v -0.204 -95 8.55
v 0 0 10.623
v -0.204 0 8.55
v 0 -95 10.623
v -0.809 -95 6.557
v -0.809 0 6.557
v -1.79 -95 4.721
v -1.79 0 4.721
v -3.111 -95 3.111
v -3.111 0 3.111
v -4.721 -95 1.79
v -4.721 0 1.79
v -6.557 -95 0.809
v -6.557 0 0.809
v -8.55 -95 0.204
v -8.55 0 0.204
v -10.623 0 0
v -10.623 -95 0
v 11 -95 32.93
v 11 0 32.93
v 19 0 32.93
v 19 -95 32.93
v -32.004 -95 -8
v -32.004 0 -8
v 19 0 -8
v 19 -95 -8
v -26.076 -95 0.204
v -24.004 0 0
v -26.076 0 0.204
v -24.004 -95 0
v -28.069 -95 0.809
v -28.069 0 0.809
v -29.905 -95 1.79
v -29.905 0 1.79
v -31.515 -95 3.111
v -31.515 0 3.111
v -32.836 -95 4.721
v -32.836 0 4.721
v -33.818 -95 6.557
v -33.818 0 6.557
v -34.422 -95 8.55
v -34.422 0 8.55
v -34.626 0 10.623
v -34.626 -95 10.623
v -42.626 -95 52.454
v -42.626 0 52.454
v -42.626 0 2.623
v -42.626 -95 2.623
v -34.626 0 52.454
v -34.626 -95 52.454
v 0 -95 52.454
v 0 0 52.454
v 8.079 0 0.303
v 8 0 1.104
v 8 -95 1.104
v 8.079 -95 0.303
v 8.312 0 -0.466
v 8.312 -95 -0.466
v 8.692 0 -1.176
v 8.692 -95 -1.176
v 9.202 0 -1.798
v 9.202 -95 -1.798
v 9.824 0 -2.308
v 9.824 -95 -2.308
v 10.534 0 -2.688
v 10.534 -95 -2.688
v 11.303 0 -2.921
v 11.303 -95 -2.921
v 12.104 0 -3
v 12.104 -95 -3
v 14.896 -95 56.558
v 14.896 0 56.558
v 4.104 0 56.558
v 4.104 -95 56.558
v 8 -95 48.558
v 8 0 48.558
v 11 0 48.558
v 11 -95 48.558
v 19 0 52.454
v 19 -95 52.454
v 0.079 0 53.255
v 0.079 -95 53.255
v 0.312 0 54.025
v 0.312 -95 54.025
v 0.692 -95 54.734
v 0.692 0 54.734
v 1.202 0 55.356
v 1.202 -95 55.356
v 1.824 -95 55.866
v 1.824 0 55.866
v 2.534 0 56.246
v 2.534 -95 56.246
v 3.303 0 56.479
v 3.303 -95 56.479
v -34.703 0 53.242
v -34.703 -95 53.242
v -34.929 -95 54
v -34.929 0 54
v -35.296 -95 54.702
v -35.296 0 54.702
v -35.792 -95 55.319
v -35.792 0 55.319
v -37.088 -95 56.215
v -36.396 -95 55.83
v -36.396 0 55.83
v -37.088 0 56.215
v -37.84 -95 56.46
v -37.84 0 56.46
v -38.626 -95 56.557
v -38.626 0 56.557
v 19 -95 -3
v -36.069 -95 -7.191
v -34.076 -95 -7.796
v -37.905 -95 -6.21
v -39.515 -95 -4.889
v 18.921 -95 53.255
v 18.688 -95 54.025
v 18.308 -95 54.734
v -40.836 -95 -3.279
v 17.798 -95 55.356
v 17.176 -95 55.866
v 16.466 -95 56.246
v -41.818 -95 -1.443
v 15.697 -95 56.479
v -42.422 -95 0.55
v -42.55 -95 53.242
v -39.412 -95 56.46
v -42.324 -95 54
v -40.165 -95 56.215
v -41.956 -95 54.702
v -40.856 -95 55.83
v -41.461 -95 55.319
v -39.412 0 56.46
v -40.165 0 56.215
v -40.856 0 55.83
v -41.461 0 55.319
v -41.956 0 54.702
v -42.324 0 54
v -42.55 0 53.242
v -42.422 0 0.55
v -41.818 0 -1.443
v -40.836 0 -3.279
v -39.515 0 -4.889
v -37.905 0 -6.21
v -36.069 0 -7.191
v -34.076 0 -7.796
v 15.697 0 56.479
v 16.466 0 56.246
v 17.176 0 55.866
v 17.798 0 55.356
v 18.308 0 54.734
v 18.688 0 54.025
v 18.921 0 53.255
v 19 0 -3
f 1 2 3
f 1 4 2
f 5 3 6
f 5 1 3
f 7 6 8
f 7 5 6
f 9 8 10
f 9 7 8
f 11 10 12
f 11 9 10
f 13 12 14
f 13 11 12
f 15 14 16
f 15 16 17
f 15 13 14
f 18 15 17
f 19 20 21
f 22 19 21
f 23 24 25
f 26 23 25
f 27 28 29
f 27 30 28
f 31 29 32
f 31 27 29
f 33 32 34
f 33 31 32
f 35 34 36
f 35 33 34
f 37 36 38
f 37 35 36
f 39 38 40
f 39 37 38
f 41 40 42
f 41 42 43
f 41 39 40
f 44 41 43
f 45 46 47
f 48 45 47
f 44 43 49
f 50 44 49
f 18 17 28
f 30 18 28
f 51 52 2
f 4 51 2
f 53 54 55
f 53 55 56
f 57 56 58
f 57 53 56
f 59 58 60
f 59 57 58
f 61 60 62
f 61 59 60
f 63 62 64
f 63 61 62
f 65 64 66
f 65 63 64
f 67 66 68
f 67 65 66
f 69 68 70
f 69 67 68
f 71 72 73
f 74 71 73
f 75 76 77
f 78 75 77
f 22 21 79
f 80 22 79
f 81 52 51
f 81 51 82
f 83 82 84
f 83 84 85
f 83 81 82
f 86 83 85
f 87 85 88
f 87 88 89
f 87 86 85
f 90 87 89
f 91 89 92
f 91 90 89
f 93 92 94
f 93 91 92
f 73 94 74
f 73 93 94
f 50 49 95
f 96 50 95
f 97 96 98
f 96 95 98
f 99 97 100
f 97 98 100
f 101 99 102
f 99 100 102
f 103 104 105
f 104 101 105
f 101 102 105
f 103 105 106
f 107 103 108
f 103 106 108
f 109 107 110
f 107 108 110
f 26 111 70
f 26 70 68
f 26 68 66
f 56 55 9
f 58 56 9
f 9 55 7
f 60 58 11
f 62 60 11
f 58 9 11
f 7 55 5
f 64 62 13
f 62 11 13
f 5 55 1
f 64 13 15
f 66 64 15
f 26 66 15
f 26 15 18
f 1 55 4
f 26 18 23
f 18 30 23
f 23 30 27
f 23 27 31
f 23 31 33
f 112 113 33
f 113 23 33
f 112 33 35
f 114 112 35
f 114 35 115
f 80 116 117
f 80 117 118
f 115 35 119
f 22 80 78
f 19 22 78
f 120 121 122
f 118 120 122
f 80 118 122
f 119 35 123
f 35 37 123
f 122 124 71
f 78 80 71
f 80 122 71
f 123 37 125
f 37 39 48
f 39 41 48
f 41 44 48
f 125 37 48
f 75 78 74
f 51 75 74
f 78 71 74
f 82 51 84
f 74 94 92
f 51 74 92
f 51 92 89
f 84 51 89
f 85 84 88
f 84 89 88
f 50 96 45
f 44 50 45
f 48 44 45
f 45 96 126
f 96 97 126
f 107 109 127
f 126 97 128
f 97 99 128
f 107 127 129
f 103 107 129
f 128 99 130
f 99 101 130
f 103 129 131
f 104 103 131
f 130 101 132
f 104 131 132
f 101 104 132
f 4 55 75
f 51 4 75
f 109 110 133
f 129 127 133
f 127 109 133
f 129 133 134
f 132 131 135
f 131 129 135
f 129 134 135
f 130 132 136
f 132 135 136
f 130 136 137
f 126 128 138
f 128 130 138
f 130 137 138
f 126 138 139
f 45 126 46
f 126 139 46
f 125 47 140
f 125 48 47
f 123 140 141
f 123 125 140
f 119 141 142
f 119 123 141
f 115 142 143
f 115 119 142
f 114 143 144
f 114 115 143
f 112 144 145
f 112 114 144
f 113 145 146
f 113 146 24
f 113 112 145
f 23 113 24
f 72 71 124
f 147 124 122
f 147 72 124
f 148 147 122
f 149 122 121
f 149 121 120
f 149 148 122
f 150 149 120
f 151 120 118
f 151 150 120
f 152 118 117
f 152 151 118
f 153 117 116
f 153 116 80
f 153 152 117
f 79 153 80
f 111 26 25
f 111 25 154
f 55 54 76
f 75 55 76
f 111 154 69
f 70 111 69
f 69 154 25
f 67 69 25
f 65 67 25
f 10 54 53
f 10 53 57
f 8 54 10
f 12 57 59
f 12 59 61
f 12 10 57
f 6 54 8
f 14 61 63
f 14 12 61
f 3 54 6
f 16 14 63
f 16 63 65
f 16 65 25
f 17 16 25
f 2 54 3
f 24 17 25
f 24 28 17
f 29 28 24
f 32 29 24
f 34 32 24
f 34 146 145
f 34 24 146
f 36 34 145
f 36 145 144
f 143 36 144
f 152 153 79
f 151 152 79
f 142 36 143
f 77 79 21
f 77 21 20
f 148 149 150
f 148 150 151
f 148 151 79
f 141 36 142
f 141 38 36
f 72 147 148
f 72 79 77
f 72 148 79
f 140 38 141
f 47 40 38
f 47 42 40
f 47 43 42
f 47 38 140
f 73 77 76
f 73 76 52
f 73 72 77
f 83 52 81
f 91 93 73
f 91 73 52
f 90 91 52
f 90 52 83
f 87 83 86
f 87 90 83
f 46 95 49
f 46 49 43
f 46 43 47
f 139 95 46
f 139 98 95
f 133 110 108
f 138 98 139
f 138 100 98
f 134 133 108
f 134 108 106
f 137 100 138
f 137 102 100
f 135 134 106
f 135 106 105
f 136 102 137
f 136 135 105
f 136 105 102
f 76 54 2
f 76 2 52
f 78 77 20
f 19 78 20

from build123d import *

# Parameters (mm, degrees)
F1_DEPTH    = 95
F2_T1_DEPTH = 95
F2_T3_DEPTH = 115.5208152802
F3_R        = 10.6225396744


# Not quite as in the source:
# - a fillet or chamfer that OpenCascade refuses, or shapes differently, is made with other operations: its cross-section is extruded or revolved along the edge and cut away or added


with BuildPart() as f1:
    # F0 (on Front) → F1 (new body)
    with BuildSketch(Plane.XZ):
        Polygon((0, 56.5581262502), (0, 0), (-34.6262017979, 0), (-34.6262017979, 56.5581262502), (-42.6262017979, 56.5581262502), (-42.6262017979, -8), (8, -8), (19, -8), (19, -3), (8, -3), (8, 48.5581262502), (11, 48.5581262502), (11, 32.9302263872), (19.0000018427, 32.9302263872), (19.0000018427, 56.5581262502), align=None)
    extrude(amount=F1_DEPTH)

    # F2: fillet of radius 4.104163056 on 5 edges, made by hand

    # F2_s2 → F2_t1 (join)
    with BuildSketch(Plane.XZ):
        with BuildLine():
            ThreePointArc((8, 1.104163056), (9.202081528, -1.797918472), (12.104163056, -3))
            Line((12.104163056, -3), (8, -3))
            Line((8, -3), (8, 1.104163056))
        make_face()
    extrude(amount=F2_T1_DEPTH)

    # F2_s4 → F2_t3 (cut)
    with BuildSketch(Plane.XZ.offset(-10.2604076401)):
        with BuildLine():
            ThreePointArc((-38.5220387419, 56.5581262502), (-41.4241202699, 55.3560447222), (-42.6262017979, 52.4539631941))
            Line((-42.6262017979, 52.4539631941), (-42.6262017979, 56.5581262502))
            Line((-42.6262017979, 56.5581262502), (-38.5220387419, 56.5581262502))
        make_face()
        with BuildLine():
            ThreePointArc((-34.6262017979, 52.4539631941), (-35.828283326, 55.3560447222), (-38.730364854, 56.5581262502))
            Line((-38.730364854, 56.5581262502), (-34.6262017979, 56.5581262502))
            Line((-34.6262017979, 56.5581262502), (-34.6262017979, 52.4539631941))
        make_face()
        with BuildLine():
            ThreePointArc((0, 52.4539631941), (1.202081528, 55.3560447222), (4.104163056, 56.5581262502))
            Line((4.104163056, 56.5581262502), (0, 56.5581262502))
            Line((0, 56.5581262502), (0, 52.4539631941))
        make_face()
        with BuildLine():
            ThreePointArc((14.8958387867, 56.5581262502), (17.7979203147, 55.3560447222), (19.0000018427, 52.4539631941))
            Line((19.0000018427, 52.4539631941), (19.0000018427, 56.5581262502))
            Line((19.0000018427, 56.5581262502), (14.8958387867, 56.5581262502))
        make_face()
    extrude(amount=F2_T3_DEPTH, mode=Mode.SUBTRACT)

    # F3
    f3_edges = [f1.edges().sort_by_distance(p)[0] for p in [
        (-34.626202, -47.5, 0),
        (0, -47.5, 0),
        (-42.626202, -47.5, -8),
    ]]
    fillet(f3_edges, radius=F3_R)


solid = f1.part
